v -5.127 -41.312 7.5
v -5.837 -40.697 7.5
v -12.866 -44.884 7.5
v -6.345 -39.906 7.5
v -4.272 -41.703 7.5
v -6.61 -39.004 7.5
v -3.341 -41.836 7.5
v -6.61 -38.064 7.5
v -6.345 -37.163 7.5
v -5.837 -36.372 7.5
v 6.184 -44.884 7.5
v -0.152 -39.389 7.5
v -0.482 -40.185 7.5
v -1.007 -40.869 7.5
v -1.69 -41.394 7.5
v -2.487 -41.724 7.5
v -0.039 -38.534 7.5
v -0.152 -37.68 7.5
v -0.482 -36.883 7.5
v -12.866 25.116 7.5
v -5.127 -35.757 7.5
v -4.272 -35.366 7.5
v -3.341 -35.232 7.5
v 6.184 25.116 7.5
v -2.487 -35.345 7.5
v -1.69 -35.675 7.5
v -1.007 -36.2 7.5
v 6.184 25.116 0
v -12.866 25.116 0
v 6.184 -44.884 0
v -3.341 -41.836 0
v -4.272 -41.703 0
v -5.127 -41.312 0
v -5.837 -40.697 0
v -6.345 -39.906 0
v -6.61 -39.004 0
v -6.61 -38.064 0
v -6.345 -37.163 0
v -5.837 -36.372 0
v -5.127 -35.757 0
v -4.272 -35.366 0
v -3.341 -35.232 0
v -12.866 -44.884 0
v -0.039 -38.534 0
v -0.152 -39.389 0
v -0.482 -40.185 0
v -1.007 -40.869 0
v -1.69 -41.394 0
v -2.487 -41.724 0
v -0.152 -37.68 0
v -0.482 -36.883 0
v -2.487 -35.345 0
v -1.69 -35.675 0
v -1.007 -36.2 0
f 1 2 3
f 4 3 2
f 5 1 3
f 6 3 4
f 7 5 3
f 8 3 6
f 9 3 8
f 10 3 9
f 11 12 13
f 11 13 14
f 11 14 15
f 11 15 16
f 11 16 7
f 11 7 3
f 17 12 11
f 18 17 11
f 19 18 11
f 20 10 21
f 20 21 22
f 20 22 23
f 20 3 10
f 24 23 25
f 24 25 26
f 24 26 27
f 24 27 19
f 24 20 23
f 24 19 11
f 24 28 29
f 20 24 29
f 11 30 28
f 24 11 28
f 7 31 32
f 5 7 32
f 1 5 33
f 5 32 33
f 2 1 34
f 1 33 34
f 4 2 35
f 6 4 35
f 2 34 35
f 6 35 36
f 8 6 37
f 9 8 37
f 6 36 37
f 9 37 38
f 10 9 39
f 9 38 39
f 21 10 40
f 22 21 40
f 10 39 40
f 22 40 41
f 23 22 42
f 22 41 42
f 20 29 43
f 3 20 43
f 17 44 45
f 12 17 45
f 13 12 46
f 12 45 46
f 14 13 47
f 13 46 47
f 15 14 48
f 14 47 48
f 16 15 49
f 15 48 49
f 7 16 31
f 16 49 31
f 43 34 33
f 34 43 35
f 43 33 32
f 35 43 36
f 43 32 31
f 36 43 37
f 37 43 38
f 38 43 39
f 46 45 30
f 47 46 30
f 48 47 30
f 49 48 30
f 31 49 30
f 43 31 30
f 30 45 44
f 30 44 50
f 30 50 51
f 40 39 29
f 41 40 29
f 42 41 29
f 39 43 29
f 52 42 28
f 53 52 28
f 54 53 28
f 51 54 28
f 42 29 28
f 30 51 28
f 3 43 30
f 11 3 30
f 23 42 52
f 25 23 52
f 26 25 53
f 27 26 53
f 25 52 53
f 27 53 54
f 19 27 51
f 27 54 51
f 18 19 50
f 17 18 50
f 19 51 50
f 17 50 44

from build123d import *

# Parameters (mm, degrees)
F1_DEPTH = 7.5


with BuildPart() as f1:
    # F0 (on Top) → F1 (new body)
    with BuildSketch(Plane.XY):
        with BuildLine():
            Line((-3.341401, 25.115587), (-12.866401, 25.115587))
            Line((-12.866401, 25.115587), (-12.866401, -44.884413))
            Line((-12.866401, -44.884413), (-3.341401, -44.884413))
            Line((-3.341401, -44.884413), (-3.341401, -41.836413))
            ThreePointArc((-3.341401, -41.836413), (-6.643401, -38.534413), (-3.341401, -35.232413))
            Line((-3.341401, -35.232413), (-3.341401, 25.115587))
        make_face()
        with BuildLine():
            Line((6.183599, 25.115587), (-3.341401, 25.115587))
            Line((-3.341401, 25.115587), (-3.341401, -35.232413))
            ThreePointArc((-3.341401, -35.232413), (-1.006534, -36.199547), (-0.039401, -38.534413))
            ThreePointArc((-0.039401, -38.534413), (-1.006534, -40.86928), (-3.341401, -41.836413))
            Line((-3.341401, -41.836413), (-3.341401, -44.884413))
            Line((-3.341401, -44.884413), (6.183599, -44.884413))
            Line((6.183599, -44.884413), (6.183599, 25.115587))
        make_face()
    extrude(amount=F1_DEPTH)


solid = f1.part
